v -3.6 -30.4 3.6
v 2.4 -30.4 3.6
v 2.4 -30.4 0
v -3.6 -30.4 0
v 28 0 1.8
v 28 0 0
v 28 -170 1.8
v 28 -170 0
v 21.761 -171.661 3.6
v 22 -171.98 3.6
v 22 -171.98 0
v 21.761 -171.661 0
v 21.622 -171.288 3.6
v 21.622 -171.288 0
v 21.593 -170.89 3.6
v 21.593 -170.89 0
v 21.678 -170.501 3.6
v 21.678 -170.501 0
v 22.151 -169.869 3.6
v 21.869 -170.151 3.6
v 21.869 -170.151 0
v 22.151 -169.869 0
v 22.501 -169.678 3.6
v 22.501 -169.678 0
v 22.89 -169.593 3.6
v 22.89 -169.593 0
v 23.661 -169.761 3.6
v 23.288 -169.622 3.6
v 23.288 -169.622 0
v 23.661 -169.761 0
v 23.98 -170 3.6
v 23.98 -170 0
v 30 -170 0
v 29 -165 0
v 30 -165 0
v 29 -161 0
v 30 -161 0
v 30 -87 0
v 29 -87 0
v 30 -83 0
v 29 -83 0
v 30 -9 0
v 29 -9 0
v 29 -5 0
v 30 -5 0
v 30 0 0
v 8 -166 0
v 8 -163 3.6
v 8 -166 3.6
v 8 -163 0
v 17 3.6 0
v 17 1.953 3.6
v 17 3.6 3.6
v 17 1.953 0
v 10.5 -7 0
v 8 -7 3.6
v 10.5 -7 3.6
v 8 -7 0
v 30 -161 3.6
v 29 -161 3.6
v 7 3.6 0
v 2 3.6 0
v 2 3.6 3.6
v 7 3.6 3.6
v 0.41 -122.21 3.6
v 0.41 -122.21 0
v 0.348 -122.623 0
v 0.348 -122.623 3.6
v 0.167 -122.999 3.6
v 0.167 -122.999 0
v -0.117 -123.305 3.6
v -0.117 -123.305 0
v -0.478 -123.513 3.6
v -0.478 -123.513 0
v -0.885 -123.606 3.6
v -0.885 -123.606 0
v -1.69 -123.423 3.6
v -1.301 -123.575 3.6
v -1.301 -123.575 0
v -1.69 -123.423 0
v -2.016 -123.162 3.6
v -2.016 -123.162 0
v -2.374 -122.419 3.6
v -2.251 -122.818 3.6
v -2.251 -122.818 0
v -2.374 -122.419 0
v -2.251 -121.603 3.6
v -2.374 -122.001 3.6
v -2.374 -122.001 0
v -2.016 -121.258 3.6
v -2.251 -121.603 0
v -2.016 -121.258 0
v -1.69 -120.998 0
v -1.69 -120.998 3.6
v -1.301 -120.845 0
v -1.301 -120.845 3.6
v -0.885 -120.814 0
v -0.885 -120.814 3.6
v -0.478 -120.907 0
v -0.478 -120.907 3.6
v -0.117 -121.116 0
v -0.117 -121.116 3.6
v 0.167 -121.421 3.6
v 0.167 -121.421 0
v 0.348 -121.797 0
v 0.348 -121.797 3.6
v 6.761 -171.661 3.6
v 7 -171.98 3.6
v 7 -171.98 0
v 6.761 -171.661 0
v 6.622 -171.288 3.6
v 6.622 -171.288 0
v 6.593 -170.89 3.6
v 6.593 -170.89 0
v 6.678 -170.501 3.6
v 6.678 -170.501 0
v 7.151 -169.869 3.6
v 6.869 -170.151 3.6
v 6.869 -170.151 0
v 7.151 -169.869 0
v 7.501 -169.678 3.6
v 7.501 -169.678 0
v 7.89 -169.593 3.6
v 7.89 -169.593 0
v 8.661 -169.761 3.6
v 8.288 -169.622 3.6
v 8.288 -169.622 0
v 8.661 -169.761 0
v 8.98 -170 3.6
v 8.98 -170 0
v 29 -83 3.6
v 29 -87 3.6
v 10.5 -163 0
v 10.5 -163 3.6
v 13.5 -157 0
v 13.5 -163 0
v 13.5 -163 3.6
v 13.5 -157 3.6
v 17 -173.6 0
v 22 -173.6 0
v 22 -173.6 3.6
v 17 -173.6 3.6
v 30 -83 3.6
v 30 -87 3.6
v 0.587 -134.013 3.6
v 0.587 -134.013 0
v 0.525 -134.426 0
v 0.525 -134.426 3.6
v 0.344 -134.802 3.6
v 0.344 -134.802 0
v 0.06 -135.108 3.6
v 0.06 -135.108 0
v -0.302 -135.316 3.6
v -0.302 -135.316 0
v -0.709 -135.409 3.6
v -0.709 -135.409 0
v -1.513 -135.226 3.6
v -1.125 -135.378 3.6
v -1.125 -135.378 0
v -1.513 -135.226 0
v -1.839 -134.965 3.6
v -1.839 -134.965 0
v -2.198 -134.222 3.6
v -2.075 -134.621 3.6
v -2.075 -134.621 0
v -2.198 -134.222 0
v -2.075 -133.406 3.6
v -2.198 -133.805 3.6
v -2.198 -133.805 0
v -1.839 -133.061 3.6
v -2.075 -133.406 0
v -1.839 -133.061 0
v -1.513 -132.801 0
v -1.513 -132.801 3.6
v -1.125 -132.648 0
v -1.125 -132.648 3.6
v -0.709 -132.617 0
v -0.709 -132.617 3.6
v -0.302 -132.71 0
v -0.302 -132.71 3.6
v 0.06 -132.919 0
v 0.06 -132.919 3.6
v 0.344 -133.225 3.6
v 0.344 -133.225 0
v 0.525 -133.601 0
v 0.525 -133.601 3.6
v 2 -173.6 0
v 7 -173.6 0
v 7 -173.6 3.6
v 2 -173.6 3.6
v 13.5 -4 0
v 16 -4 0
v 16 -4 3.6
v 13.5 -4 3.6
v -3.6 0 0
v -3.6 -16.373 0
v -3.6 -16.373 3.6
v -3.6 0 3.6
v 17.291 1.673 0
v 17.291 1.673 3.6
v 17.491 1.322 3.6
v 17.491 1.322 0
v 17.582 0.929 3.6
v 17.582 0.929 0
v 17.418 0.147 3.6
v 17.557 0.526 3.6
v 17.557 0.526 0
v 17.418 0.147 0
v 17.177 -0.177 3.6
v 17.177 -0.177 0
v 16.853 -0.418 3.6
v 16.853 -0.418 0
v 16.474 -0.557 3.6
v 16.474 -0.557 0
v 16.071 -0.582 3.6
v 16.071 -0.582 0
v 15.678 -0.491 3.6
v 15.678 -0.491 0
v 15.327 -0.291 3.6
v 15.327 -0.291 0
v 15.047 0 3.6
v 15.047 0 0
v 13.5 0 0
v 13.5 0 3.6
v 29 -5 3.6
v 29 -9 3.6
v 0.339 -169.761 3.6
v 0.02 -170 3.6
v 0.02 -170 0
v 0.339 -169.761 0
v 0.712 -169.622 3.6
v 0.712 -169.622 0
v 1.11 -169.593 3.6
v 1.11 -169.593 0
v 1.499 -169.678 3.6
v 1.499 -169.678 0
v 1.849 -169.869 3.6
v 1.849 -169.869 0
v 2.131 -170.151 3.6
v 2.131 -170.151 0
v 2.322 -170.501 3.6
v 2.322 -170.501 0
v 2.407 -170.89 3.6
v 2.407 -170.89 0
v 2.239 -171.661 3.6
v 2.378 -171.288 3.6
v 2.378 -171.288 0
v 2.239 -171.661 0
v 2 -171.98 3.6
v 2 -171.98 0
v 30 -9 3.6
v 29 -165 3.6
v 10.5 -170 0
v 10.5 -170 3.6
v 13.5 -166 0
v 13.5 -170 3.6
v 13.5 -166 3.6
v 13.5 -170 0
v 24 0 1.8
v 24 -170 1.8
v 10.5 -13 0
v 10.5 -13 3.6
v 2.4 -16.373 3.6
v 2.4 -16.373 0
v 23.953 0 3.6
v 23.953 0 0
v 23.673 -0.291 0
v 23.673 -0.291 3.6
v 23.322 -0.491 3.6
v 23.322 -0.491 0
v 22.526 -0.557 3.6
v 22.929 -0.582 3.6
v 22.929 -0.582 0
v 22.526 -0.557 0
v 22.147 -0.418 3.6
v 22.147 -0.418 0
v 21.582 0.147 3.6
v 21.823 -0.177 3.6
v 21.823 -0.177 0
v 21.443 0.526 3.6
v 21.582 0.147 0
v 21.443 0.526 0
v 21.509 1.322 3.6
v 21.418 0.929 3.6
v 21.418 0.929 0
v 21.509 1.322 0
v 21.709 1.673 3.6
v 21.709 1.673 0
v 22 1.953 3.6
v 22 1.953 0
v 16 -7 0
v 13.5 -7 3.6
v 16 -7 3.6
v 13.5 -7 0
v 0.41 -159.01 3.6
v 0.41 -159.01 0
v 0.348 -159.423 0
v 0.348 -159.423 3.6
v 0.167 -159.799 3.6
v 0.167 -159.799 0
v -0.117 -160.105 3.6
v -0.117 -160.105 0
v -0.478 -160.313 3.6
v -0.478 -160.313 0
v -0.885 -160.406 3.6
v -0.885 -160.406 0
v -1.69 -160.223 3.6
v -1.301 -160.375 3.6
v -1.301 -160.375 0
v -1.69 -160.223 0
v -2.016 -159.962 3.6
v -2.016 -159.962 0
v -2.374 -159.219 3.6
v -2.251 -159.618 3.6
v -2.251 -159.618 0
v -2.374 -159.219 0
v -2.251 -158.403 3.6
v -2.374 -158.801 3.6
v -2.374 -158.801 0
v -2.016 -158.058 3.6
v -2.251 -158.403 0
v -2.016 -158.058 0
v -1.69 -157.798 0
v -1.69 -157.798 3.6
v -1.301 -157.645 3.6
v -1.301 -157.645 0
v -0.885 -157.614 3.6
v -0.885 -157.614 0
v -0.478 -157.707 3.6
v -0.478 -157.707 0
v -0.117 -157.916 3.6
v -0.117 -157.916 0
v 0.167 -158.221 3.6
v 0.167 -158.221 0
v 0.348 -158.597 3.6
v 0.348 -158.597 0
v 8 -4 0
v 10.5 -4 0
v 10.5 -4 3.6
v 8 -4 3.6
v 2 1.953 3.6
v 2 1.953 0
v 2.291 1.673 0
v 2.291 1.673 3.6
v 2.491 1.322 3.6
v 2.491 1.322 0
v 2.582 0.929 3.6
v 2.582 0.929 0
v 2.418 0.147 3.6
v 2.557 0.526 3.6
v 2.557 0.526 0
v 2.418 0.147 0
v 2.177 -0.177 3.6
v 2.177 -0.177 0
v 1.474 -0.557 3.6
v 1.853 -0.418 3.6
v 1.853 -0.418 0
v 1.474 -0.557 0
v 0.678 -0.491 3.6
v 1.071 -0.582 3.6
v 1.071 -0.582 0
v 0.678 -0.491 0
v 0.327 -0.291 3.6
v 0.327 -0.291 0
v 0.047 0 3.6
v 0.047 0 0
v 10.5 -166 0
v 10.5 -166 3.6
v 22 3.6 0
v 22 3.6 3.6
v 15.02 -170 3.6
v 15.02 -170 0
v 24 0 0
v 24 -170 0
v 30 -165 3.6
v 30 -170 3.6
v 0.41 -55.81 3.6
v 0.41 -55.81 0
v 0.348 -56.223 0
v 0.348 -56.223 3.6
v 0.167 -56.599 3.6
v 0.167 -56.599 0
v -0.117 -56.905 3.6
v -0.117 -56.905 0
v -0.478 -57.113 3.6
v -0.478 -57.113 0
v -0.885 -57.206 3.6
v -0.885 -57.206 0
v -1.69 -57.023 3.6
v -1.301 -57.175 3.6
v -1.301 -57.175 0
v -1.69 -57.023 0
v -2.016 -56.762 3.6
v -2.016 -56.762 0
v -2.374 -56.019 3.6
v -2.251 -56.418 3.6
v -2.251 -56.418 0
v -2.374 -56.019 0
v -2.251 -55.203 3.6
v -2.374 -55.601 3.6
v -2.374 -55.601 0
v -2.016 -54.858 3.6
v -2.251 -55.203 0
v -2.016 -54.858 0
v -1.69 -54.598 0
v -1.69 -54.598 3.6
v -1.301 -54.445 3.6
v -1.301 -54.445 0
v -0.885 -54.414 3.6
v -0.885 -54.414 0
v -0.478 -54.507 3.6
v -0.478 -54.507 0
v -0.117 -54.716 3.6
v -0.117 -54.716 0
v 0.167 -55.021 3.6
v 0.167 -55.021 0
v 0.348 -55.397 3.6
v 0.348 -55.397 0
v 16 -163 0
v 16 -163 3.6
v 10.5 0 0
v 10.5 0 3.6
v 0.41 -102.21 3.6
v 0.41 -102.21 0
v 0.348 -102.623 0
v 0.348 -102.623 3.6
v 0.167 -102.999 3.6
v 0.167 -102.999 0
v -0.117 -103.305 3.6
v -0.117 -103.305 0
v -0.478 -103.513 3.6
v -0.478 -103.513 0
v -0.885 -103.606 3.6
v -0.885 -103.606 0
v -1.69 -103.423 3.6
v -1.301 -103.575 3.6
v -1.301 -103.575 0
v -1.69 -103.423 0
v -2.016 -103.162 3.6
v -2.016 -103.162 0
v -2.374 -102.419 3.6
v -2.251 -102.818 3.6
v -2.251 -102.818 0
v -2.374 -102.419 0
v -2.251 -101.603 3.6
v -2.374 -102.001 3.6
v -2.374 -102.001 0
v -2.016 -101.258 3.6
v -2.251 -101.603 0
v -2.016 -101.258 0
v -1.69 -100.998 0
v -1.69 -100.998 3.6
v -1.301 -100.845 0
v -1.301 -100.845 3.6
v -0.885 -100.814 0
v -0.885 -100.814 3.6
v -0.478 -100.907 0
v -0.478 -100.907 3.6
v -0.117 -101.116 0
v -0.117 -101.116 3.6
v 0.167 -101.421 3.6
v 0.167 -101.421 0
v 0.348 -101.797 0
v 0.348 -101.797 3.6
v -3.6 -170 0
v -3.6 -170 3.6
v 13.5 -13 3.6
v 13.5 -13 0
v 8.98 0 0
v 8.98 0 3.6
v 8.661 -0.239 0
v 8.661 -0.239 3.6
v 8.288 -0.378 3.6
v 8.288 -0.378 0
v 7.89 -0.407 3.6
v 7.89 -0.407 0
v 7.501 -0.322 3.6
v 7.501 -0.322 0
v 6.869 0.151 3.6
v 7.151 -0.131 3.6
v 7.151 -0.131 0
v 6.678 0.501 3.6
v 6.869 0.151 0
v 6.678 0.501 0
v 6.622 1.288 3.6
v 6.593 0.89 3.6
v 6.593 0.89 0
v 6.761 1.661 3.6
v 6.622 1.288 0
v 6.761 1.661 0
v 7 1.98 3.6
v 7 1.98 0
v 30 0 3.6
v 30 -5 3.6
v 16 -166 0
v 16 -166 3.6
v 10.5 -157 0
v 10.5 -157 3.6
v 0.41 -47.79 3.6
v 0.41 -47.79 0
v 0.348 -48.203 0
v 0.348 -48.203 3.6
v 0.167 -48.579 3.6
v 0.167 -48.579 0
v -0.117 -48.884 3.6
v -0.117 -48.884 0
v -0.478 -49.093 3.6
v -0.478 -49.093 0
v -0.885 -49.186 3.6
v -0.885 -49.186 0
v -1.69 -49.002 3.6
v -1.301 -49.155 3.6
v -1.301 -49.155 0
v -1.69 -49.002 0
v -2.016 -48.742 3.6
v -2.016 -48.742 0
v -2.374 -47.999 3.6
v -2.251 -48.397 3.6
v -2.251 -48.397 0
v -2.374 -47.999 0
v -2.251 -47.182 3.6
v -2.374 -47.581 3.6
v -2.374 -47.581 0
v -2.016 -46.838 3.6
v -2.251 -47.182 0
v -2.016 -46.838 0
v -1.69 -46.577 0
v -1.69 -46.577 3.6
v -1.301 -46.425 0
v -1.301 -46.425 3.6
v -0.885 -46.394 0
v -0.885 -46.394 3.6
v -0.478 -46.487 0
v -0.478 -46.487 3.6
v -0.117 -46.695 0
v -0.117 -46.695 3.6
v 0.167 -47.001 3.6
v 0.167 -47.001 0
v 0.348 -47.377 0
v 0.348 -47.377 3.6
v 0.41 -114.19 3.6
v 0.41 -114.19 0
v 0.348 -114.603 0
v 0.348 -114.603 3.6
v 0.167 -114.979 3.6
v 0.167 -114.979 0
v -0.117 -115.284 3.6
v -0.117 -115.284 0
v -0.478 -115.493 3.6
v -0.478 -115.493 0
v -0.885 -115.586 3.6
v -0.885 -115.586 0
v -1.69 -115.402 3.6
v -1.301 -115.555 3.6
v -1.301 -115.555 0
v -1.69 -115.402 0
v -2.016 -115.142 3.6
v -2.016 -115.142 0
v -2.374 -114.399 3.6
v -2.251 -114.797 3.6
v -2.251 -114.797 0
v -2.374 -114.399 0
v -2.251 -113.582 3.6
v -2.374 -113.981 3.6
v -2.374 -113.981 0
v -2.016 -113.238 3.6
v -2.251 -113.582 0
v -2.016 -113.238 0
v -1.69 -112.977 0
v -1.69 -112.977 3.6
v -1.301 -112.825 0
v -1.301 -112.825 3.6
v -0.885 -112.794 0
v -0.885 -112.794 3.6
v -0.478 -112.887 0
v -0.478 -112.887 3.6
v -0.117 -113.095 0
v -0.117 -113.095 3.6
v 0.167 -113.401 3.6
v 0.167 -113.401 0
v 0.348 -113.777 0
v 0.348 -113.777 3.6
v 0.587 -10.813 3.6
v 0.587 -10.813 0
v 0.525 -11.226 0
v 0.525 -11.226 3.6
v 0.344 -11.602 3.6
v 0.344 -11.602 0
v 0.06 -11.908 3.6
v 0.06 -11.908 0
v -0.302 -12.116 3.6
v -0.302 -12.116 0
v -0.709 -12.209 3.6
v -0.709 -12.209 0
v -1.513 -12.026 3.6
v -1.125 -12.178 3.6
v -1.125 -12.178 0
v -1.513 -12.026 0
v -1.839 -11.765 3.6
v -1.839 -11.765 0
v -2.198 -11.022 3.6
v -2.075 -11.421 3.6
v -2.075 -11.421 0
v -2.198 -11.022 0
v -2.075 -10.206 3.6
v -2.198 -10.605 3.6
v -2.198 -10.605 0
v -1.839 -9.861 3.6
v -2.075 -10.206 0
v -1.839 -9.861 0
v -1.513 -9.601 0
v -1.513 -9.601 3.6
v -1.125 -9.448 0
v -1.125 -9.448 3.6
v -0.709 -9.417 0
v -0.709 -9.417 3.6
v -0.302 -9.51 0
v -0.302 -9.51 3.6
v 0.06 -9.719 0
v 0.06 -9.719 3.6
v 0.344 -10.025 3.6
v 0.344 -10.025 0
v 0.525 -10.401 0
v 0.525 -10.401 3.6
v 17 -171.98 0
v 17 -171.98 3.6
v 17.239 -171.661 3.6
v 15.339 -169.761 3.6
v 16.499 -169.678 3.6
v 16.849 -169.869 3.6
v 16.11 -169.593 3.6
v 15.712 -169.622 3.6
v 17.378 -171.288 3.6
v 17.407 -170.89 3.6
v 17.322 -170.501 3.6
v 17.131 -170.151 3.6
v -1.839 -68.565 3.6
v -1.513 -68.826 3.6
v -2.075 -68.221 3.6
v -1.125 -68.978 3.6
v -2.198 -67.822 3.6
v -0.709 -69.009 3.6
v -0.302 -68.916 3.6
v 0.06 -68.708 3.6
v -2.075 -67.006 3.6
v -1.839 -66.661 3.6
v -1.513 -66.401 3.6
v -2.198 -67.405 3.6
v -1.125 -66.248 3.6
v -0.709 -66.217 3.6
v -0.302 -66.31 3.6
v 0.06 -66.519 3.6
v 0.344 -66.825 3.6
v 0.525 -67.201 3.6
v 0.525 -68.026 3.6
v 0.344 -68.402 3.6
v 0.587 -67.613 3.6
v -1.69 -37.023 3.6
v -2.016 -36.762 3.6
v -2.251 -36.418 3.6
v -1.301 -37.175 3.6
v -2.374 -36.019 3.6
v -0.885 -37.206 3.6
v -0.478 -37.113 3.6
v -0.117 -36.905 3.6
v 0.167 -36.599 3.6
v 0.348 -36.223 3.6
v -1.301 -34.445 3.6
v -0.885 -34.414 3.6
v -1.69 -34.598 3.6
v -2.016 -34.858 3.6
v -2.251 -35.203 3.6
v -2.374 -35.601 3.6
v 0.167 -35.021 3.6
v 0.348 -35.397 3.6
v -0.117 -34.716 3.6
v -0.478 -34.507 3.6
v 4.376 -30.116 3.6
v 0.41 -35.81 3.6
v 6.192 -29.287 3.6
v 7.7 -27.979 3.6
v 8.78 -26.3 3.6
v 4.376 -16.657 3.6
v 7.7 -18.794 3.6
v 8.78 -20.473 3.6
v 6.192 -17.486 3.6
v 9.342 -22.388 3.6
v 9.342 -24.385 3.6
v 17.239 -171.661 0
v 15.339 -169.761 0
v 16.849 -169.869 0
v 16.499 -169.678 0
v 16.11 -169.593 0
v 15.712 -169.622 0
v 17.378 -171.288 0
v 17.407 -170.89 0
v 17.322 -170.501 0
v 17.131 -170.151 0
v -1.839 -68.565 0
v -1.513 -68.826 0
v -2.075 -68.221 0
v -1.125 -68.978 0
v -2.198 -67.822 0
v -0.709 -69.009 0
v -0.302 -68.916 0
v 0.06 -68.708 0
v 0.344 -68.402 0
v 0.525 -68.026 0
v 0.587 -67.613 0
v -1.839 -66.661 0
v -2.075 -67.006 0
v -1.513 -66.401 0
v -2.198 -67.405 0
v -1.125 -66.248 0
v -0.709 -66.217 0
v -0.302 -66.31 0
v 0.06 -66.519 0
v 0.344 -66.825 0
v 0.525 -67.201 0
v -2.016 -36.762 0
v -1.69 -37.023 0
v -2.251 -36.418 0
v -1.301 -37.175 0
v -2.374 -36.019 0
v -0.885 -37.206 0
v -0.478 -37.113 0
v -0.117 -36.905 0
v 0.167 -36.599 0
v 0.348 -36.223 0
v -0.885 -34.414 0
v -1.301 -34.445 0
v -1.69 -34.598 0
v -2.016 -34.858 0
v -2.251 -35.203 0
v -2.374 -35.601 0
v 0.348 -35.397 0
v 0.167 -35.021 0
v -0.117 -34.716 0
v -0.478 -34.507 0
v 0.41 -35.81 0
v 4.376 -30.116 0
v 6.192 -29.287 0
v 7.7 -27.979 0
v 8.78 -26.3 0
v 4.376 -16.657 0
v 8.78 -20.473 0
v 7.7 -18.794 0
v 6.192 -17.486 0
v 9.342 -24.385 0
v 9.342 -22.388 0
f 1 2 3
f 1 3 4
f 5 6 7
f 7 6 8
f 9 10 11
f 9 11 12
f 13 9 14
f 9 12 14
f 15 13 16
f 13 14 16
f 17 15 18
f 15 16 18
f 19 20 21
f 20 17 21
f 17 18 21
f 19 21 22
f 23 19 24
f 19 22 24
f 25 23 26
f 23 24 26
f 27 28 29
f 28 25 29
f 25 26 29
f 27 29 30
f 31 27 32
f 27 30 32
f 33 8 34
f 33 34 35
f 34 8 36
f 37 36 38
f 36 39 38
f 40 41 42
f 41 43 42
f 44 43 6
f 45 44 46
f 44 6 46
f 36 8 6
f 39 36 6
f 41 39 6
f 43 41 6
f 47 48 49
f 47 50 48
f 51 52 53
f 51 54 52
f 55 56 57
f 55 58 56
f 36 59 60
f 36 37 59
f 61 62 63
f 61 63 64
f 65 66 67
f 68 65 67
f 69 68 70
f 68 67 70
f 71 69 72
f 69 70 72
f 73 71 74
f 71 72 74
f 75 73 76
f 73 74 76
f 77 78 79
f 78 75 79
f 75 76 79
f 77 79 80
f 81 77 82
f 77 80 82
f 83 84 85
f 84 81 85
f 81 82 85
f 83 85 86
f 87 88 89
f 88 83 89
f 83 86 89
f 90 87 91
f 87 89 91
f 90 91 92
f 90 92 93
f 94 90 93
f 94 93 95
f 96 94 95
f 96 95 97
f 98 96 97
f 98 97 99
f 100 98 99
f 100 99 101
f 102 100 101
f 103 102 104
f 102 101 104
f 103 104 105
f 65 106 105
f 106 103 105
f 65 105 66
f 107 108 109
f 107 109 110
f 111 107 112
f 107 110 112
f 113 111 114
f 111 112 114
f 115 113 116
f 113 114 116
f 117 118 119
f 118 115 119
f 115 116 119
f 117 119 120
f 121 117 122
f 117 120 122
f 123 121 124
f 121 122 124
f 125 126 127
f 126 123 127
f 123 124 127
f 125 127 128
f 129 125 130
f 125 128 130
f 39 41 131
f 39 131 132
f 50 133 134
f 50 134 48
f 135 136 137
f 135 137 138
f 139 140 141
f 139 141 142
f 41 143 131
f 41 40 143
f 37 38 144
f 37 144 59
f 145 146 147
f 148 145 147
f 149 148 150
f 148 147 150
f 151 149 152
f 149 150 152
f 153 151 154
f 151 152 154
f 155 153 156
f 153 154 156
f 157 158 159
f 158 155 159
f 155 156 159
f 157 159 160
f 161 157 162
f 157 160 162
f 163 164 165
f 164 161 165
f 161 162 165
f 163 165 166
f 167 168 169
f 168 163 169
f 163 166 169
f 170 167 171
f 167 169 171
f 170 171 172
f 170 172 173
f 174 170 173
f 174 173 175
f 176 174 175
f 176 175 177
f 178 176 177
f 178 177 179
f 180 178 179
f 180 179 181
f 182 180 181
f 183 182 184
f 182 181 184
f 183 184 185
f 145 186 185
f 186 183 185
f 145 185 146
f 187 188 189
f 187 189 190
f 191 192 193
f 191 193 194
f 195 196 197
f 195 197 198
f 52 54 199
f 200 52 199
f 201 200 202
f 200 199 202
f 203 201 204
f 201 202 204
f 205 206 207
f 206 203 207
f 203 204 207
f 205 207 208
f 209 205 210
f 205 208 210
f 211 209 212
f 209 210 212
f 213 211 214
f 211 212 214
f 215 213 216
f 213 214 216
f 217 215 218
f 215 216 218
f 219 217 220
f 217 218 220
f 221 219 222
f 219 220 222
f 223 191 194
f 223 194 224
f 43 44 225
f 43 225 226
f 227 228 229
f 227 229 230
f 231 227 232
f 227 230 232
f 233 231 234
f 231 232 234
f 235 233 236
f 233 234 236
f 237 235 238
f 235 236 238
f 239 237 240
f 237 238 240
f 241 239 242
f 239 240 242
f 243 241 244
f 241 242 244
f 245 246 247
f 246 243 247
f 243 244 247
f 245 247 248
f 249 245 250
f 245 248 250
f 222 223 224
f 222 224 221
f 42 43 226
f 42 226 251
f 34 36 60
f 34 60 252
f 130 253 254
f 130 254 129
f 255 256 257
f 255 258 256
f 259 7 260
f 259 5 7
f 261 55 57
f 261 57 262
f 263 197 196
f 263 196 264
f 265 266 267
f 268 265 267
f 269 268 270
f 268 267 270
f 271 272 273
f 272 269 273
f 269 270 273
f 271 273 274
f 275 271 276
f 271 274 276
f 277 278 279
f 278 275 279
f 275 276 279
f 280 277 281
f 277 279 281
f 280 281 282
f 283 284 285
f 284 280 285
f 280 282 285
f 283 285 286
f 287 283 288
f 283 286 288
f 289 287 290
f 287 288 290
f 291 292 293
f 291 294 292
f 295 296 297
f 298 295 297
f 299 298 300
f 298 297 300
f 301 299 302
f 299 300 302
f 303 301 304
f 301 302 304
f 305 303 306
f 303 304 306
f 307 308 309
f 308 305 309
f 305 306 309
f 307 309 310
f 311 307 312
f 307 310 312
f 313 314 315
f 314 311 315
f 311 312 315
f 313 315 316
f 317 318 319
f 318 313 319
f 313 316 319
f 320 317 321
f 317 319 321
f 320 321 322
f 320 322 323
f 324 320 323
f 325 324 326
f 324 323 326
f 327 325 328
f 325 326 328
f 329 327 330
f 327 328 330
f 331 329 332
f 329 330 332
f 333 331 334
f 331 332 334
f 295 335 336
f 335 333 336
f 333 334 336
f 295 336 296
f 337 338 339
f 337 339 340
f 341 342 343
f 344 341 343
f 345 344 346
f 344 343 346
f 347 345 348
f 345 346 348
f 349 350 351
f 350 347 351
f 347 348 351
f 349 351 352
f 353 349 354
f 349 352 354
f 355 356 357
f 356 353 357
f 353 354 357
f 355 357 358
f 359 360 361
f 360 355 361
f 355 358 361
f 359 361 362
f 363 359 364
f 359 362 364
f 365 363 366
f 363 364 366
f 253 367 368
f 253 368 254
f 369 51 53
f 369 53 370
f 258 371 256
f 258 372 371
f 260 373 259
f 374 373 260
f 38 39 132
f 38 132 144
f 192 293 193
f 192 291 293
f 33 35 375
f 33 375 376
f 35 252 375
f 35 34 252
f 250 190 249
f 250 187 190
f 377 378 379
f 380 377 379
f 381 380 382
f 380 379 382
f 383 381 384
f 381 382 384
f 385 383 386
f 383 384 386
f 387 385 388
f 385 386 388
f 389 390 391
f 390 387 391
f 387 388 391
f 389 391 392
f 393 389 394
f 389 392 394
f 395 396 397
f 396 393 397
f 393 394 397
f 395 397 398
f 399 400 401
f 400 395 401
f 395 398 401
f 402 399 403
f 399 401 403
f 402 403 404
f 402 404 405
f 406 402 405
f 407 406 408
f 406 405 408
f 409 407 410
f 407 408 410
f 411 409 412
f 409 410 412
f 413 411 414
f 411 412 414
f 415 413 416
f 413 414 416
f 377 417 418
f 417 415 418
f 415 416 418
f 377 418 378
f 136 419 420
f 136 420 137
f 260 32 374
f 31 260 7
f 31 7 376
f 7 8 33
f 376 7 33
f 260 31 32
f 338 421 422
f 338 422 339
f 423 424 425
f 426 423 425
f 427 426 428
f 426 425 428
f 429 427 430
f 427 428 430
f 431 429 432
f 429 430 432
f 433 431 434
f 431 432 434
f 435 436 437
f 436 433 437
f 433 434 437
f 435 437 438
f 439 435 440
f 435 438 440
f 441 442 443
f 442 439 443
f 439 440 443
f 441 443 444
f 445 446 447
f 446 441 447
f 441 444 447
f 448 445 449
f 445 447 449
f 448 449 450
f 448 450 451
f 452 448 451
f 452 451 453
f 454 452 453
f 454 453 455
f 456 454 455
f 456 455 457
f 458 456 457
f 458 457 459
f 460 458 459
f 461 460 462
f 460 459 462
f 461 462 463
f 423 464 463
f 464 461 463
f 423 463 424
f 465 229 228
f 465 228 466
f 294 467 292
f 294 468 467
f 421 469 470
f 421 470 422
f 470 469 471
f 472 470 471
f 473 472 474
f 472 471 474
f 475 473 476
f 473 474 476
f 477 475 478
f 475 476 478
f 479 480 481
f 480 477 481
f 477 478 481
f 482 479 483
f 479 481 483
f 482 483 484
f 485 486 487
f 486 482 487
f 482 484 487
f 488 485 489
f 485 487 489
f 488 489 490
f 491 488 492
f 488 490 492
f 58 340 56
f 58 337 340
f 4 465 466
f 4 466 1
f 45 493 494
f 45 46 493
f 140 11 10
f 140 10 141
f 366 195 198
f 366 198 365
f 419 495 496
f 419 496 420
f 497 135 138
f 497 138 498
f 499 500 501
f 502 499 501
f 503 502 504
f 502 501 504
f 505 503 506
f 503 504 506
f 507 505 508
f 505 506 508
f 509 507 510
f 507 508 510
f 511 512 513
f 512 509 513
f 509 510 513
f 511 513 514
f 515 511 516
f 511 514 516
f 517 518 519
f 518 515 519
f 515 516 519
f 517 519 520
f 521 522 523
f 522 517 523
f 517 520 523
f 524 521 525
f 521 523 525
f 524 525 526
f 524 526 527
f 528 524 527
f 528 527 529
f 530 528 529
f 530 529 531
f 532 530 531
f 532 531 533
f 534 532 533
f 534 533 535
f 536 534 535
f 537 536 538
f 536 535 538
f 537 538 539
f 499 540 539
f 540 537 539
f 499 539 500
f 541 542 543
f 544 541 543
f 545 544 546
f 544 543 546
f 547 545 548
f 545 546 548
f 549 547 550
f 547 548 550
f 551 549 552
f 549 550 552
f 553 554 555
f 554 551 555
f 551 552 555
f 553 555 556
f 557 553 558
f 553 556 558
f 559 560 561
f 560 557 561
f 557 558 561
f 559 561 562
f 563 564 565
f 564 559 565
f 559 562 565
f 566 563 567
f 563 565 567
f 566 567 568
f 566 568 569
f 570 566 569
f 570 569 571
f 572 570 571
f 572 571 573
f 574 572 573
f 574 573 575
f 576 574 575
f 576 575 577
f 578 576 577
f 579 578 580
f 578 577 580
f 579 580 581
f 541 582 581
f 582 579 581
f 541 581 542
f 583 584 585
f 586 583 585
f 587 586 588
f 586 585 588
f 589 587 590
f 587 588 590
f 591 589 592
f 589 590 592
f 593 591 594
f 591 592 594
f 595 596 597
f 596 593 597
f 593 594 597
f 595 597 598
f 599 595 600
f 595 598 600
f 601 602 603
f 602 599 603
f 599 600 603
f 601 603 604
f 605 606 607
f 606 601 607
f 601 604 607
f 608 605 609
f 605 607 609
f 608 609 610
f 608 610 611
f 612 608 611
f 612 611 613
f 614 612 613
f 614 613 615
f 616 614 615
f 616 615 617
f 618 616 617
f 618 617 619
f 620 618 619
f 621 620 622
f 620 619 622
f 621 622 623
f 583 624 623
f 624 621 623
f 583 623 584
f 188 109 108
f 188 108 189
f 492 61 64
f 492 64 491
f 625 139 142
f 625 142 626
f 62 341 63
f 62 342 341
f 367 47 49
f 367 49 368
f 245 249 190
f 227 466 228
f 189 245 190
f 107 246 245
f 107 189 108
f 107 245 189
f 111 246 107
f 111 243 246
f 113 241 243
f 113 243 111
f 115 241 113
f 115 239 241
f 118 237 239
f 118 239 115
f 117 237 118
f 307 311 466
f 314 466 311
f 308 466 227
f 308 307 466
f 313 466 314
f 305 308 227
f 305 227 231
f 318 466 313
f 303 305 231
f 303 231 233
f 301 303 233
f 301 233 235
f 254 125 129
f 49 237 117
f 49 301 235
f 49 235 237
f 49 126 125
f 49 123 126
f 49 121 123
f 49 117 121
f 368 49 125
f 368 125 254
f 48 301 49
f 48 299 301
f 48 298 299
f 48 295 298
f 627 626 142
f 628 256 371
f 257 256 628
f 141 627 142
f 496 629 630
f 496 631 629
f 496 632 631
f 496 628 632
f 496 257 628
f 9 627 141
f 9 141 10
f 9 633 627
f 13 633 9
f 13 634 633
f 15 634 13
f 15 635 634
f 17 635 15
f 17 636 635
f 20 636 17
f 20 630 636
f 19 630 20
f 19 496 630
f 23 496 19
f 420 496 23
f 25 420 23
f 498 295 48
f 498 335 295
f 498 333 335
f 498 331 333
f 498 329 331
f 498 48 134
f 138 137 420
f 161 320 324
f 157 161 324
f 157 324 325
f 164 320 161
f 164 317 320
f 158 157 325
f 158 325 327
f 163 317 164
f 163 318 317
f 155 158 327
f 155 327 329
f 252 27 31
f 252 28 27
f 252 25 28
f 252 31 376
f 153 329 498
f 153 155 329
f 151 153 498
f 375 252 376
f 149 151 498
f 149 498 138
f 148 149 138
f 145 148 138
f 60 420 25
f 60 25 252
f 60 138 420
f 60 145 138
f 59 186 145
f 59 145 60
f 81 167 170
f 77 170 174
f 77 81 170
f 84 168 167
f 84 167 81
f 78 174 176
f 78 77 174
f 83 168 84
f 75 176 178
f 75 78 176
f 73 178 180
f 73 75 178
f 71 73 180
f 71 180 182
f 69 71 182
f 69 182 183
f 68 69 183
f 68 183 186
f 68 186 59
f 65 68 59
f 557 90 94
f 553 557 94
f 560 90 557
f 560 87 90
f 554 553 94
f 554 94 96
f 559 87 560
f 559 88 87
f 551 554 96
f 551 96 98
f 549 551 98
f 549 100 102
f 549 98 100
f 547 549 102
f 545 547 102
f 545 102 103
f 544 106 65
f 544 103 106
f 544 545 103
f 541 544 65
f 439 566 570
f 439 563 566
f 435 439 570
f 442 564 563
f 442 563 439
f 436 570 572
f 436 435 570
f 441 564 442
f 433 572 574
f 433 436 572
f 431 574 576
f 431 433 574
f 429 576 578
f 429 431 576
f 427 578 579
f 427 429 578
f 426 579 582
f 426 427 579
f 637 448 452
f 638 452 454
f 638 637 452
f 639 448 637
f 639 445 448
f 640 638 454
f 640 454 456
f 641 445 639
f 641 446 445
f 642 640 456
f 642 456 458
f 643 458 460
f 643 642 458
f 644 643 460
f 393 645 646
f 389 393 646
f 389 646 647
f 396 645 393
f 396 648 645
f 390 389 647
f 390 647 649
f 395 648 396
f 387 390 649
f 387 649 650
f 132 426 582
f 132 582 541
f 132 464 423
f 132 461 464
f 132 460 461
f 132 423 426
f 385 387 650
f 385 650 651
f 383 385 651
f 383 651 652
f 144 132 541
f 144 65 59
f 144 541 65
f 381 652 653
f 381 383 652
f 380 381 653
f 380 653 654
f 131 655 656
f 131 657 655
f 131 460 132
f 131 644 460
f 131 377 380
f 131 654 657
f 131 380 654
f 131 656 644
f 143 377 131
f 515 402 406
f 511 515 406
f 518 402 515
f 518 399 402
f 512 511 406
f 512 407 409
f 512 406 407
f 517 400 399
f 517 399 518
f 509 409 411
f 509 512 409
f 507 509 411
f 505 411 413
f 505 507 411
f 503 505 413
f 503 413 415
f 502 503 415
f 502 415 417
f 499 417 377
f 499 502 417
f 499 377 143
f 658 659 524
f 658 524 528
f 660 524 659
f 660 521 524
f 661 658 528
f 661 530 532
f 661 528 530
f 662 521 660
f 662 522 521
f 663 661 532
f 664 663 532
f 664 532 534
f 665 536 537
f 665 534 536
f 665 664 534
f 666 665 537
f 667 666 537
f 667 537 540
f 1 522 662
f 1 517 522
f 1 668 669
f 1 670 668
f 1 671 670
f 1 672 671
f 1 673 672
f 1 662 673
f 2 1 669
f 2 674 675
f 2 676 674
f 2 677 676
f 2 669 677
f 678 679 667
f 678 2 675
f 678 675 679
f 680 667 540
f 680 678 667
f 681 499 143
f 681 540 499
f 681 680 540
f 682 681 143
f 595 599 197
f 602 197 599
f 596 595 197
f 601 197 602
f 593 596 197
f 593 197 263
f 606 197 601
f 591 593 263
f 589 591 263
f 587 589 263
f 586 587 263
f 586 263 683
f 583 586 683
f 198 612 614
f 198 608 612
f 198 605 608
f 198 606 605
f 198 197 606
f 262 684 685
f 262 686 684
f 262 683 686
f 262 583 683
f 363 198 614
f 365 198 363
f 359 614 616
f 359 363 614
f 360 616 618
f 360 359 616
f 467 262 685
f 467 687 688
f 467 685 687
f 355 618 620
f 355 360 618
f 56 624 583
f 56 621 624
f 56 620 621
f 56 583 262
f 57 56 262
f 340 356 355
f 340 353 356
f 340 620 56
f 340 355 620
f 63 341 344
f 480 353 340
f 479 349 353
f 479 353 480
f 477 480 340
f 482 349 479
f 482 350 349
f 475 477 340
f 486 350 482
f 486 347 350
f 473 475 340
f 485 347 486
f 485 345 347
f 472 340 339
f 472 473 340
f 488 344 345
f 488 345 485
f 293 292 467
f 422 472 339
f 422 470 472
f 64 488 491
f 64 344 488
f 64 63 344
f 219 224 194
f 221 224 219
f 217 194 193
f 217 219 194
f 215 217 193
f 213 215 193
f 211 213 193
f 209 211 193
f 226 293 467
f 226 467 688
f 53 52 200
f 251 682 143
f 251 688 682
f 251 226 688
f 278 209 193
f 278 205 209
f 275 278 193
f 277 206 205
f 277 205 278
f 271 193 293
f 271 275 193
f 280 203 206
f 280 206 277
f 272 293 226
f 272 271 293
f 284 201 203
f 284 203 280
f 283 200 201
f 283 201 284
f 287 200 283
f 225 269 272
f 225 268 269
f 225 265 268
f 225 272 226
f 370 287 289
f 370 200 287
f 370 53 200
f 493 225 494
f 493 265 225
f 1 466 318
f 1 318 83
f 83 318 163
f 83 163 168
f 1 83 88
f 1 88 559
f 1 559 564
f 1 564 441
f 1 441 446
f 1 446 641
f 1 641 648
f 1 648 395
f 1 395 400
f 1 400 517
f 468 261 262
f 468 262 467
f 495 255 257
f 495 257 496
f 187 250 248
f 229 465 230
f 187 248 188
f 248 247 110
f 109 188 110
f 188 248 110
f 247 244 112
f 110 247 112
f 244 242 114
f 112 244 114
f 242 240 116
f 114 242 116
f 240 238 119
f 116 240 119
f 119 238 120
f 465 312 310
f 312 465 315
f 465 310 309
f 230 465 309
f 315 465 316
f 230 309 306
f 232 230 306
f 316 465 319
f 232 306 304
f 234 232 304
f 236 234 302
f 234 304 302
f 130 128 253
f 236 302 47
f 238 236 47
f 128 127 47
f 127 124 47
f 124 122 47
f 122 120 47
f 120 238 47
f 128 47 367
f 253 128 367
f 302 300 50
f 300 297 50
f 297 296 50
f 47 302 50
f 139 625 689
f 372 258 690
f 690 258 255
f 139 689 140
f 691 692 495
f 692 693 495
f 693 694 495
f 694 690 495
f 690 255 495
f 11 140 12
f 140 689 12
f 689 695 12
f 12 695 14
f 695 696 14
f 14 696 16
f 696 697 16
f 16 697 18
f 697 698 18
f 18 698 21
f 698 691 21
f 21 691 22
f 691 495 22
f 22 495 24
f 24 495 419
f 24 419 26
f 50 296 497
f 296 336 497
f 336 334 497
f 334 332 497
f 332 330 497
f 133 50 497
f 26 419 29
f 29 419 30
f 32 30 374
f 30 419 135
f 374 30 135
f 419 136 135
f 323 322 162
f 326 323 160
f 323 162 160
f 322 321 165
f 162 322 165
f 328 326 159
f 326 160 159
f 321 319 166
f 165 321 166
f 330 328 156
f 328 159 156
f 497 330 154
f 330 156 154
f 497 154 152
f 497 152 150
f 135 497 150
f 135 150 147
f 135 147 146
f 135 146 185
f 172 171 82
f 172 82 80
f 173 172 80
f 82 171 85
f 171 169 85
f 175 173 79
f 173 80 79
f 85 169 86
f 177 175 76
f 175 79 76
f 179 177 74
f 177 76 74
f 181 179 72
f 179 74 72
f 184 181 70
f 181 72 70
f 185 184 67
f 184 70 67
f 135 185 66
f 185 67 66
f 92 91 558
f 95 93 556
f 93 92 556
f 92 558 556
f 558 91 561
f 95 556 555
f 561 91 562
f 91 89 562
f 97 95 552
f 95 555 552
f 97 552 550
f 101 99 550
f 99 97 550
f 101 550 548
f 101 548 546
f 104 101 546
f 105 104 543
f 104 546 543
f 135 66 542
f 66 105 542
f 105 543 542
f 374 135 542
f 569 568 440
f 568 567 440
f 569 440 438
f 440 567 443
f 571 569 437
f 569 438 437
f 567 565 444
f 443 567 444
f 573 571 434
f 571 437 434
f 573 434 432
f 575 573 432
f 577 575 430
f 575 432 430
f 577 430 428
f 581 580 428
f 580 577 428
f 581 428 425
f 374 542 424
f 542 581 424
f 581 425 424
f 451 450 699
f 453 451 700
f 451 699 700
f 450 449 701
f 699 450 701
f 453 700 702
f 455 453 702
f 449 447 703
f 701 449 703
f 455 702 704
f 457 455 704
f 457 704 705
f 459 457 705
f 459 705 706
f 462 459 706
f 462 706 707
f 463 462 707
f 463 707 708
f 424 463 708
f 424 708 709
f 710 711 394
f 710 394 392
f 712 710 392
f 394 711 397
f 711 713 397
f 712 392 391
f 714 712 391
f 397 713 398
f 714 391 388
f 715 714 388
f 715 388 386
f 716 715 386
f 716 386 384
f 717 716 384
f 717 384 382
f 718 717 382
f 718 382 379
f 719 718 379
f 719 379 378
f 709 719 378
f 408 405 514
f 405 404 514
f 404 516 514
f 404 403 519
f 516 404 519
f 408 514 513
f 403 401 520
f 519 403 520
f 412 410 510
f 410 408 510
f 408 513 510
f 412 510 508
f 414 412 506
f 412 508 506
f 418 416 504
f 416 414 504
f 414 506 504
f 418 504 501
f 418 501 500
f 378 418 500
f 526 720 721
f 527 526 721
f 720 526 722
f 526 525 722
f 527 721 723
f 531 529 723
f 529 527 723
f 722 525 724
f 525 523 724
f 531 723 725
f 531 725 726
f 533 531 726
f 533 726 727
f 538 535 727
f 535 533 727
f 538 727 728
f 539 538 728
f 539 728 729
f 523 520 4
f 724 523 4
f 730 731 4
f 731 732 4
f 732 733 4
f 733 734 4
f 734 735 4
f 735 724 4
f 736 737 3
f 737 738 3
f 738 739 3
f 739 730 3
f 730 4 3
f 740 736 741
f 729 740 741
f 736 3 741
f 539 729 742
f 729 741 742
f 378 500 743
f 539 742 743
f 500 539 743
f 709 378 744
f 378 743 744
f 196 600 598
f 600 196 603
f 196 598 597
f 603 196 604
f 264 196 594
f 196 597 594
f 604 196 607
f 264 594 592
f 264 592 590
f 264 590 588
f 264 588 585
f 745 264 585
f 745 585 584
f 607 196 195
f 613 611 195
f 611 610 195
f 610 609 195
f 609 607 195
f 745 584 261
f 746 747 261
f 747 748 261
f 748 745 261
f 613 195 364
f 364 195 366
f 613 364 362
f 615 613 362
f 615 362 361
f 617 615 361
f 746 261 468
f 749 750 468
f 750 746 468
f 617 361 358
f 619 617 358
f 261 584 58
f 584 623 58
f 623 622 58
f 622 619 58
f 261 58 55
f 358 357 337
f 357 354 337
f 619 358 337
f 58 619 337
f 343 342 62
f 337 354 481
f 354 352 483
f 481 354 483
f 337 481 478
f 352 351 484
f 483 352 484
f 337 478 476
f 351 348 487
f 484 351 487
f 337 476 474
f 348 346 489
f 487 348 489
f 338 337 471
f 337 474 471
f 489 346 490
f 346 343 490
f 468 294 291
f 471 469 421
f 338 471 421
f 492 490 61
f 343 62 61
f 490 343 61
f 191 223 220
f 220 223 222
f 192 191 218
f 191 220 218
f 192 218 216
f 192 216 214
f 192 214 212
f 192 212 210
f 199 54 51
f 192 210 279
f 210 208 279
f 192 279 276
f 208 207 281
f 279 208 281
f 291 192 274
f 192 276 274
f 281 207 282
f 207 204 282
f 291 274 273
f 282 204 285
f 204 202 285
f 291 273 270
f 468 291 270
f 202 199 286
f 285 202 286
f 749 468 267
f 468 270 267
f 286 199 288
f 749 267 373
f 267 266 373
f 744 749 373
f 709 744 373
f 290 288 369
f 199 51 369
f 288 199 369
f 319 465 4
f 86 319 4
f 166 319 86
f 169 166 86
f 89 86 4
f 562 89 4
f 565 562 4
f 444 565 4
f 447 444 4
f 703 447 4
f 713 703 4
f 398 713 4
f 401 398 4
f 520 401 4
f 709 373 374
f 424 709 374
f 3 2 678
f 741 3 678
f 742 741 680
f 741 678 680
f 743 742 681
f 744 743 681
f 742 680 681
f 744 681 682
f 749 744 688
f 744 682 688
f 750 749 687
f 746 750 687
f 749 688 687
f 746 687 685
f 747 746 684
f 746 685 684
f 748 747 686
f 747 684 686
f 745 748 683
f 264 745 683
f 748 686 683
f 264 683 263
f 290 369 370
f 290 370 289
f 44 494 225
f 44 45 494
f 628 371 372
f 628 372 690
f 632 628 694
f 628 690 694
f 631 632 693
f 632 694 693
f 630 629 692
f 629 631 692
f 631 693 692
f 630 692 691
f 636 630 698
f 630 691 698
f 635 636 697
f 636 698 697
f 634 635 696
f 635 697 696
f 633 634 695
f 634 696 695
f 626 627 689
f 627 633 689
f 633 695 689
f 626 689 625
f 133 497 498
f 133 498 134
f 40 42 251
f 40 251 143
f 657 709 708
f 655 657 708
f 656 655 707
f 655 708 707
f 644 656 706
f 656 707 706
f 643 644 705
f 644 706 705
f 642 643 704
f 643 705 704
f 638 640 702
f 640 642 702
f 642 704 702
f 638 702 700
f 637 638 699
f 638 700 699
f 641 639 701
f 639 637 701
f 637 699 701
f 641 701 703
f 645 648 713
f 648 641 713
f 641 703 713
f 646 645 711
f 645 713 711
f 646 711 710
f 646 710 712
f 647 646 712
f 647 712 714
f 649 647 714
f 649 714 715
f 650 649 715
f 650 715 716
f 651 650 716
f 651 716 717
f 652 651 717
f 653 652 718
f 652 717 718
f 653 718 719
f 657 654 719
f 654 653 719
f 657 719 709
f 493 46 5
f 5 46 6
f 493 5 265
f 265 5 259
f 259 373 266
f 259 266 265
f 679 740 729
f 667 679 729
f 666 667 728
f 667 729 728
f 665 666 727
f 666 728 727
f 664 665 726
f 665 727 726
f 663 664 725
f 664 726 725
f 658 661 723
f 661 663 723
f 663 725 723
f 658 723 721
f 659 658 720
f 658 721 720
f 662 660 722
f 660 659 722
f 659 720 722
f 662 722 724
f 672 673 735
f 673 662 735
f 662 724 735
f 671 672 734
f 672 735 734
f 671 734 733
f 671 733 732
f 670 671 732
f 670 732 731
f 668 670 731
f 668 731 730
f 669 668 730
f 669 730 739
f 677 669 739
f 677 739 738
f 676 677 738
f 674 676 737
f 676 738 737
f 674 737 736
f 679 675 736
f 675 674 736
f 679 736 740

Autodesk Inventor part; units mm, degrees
ref_plane "YZ Plane" through (0, 0, 0) normal (1, 0, 0) x (0, 1, 0)
ref_plane "XZ Plane" through (0, 0, 0) normal (0, 1, 0) x (-1, 0, 0)
ref_plane "XY Plane" through (0, 0, 0) normal (0, 0, 1) x (1, 0, 0)
ref_plane "Work Plane1" through (0, 0, 0) normal (0, 0, 1) x (1, 0, 0)
sketch "Sketch1" plane through (0, 0, 0) normal (0, 0, 1) x (1, 0, 0)
  line L0 (30, 0) -> (23.9528, 0) projected
  line L1 (30, 0) -> (30, -5) projected
  line L2 (23.9799, -170) -> (30, -170) projected
  line L3 (22, -171.9799) -> (22, -173.6) projected
  line L4 (22, -173.6) -> (17, -173.6) projected
  line L5 (17, -173.6) -> (17, -171.9799) projected
  line L6 (15.0201, -170) -> (13.5, -170) projected
  line L7 (13.5, -170) -> (13.5, -166) projected
  line L8 (13.5, -166) -> (16, -166) projected
  line L9 (16, -166) -> (16, -163) projected
  line L10 (16, -163) -> (13.5, -163) projected
  line L11 (13.5, -163) -> (13.5, -157) projected
  line L12 (13.5, -157) -> (10.5, -157) projected
  line L13 (10.5, -157) -> (10.5, -163) projected
  line L14 (10.5, -163) -> (8, -163) projected
  line L15 (8, -163) -> (8, -166) projected
  line L16 (8, -166) -> (10.5, -166) projected
  line L17 (10.5, -166) -> (10.5, -170) projected
  line L18 (10.5, -170) -> (8.9799, -170) projected
  line L19 (7, -171.9799) -> (7, -173.6) projected
  line L20 (7, -173.6) -> (2, -173.6) projected
  line L21 (2, -173.6) -> (2, -171.9799) projected
  line L22 (0.0201, -170) -> (-3.6, -170) projected
  line L23 (-3.6, -170) -> (-3.6, 0) projected
  line L24 (-3.6, 0) -> (0.0472, 0) projected
  line L25 (2, 1.9528) -> (2, 3.6) projected
  line L26 (2, 3.6) -> (7, 3.6) projected
  line L27 (7, 3.6) -> (7, 1.9799) projected
  line L28 (8.9799, 0) -> (10.5, 0) projected
  line L29 (10.5, 0) -> (10.5, -4) projected
  line L30 (10.5, -4) -> (8, -4) projected
  line L31 (8, -4) -> (8, -7) projected
  line L32 (8, -7) -> (10.5, -7) projected
  line L33 (10.5, -7) -> (10.5, -13) projected
  line L34 (10.5, -13) -> (13.5, -13) projected
  line L35 (13.5, -13) -> (13.5, -7) projected
  line L36 (13.5, -7) -> (16, -7) projected
  line L37 (16, -7) -> (16, -4) projected
  line L38 (16, -4) -> (13.5, -4) projected
  line L39 (13.5, -4) -> (13.5, 0) projected
  line L40 (13.5, 0) -> (15.0472, 0) projected
  line L41 (17, 1.9528) -> (17, 3.6) projected
  line L42 (17, 3.6) -> (22, 3.6) projected
  line L43 (22, 3.6) -> (22, 1.9528) projected
  line L44 (29, -165) -> (30, -165) projected
  line L45 (30, -5) -> (29, -5) projected
  line L46 (29, -5) -> (29, -9) projected
  line L47 (29, -9) -> (30, -9) projected
  line L48 (30, -9) -> (30, -83) projected
  line L49 (30, -83) -> (29, -83) projected
  line L50 (29, -83) -> (29, -87) projected
  line L51 (29, -87) -> (30, -87) projected
  line L52 (30, -87) -> (30, -161) projected
  line L53 (30, -161) -> (29, -161) projected
  line L54 (29, -161) -> (29, -165) projected
  arc A0 (17, -171.9799) -> (15.0201, -170) centre (16.0101, -170.9899) ccw projected
  arc A1 (8.9799, -170) -> (7, -171.9799) centre (7.9899, -170.9899) ccw projected
  arc A2 (2, -171.9799) -> (0.0201, -170) centre (1.0101, -170.9899) ccw projected
  arc A3 (0.0472, 0) -> (2, 1.9528) centre (1.1868, 0.8132) ccw projected
  arc A4 (7, 1.9799) -> (8.9799, 0) centre (7.9899, 0.9899) ccw projected
  arc A5 (15.0472, 0) -> (17, 1.9528) centre (16.1868, 0.8132) ccw projected
  arc A6 (22, 1.9528) -> (23.9528, 0) centre (22.8132, 0.8132) ccw projected
  line L55 (30, -165) -> (30, -170) projected
  arc A7 (23.9799, -170) -> (22, -171.9799) centre (22.9899, -170.9899) ccw projected
  circle A8 centre (-0.9899, -159.0101) radius 1.4 projected
  circle A9 centre (-0.8132, -134.0132) radius 1.4 projected
  circle A10 centre (-0.9899, -122.2101) radius 1.4 projected
  circle A11 centre (-0.9899, -114.1899) radius 1.4 projected
  circle A12 centre (-0.9899, -102.2101) radius 1.4 projected
  circle A13 centre (-0.8132, -67.6132) radius 1.4 projected
  circle A14 centre (-0.9899, -55.8101) radius 1.4 projected
  circle A15 centre (-0.9899, -47.7899) radius 1.4 projected
  circle A16 centre (-0.9899, -35.8101) radius 1.4 projected
  circle A17 centre (-0.8132, -10.8132) radius 1.4 projected
  point P0 (0, 0)
  point P1 (22, 0)
  point P2 (22, -170)
  point P3 (17, -170)
  point P4 (7, -170)
  point P5 (2, -170)
  point P6 (0, -160)
  point P7 (0, -123.2)
  point P8 (0, -113.2)
  point P9 (0, -103.2)
  point P10 (0, -56.8)
  point P11 (0, -46.8)
  point P12 (0, -36.8)
  point P13 (2, 0)
  point P14 (7, 0)
  point P15 (17, 0)
  point P16 (-1.9799, -160)
  point P17 (-1.9528, -133.2)
  point P18 (-1.9799, -123.2)
  point P19 (-1.9799, -113.2)
  point P20 (-1.9799, -103.2)
  point P21 (-1.9528, -66.8)
  point P22 (-1.9799, -56.8)
  point P23 (-1.9799, -46.8)
  point P24 (-1.9799, -36.8)
  point P25 (-1.9528, -10)
  point P26 (0, -34.8201)
  point P27 (0, -11.9528)
  point P28 (0, -54.8201)
  point P29 (0, -48.7799)
  point P30 (0, -101.2201)
  point P31 (0, -68.7528)
  point P32 (0, -121.2201)
  point P33 (0, -115.1799)
  point P34 (0, -158.0201)
  point P35 (0, -135.1528)
extrude "Extrusion1" add sketch "Sketch1" along normal blind 3.6
sketch "Sketch3" plane through (0, 0, 0) normal (0, 0, -1) x (-1, 0, 0)
  line L0 (-28, -170) -> (-24, -170) projected
  line L1 (-28, 0) -> (-28, -170) projected
  line L2 (-24, 0) -> (-28, 0) projected
  line L3 (-24, 0) -> (-24, -170) projected
  point P0 (0, 0)
extrude "Extrusion3" cut sketch "Sketch3" against normal blind 1.8
sketch "Sketch16" plane through (0, 0, 3.6) normal (0, 0, 1) x (1, 0, 0)
  line L0 (30, -87) -> (29, -87) projected
  line L1 (29, -87) -> (29, -83) projected
  line L2 (29, -83) -> (30, -83) projected
  line L3 (30, -83) -> (30, -9) projected
  line L4 (30, -9) -> (29, -9) projected
  line L5 (29, -9) -> (29, -5) projected
  line L6 (29, -5) -> (30, -5) projected
  line L7 (30, -5) -> (30, 0) projected
  line L8 (30, 0) -> (23.9528, 0) projected
  arc A0 (22, 1.9528) -> (23.9528, 0) centre (22.8132, 0.8132) ccw projected
  line L9 (22, 1.9528) -> (22, 3.6) projected
  line L10 (22, 3.6) -> (17, 3.6) projected
  line L11 (17, 3.6) -> (17, 1.9528) projected
  arc A1 (15.0472, 0) -> (17, 1.9528) centre (16.1868, 0.8132) ccw projected
  line L12 (15.0472, 0) -> (13.5, 0) projected
  line L13 (13.5, 0) -> (13.5, -4) projected
  line L14 (13.5, -4) -> (16, -4) projected
  line L15 (16, -4) -> (16, -7) projected
  line L16 (16, -7) -> (13.5, -7) projected
  line L17 (13.5, -7) -> (13.5, -13) projected
  line L18 (13.5, -13) -> (10.5, -13) projected
  line L19 (10.5, -13) -> (10.5, -7) projected
  line L20 (10.5, -7) -> (8, -7) projected
  line L21 (8, -7) -> (8, -4) projected
  line L22 (8, -4) -> (10.5, -4) projected
  line L23 (10.5, -4) -> (10.5, 0) projected
  line L24 (10.5, 0) -> (8.9799, 0) projected
  arc A2 (7, 1.9799) -> (8.9799, 0) centre (7.9899, 0.9899) ccw projected
  line L25 (7, 1.9799) -> (7, 3.6) projected
  line L26 (7, 3.6) -> (2, 3.6) projected
  line L27 (2, 3.6) -> (2, 1.9528) projected
  arc A3 (0.0472, 0) -> (2, 1.9528) centre (1.1868, 0.8132) ccw projected
  line L28 (0.0472, 0) -> (-3.6, 0) projected
  circle A4 centre (-0.8132, -10.8132) radius 1.4 projected
  circle A5 centre (-0.9899, -35.8101) radius 1.4 projected
  circle A6 centre (-0.9899, -47.7899) radius 1.4 projected
  circle A7 centre (-0.9899, -55.8101) radius 1.4 projected
  circle A8 centre (-0.8132, -67.6132) radius 1.4 projected
  circle A9 centre (-0.9899, -102.2101) radius 1.4 projected
  circle A10 centre (-0.9899, -114.1899) radius 1.4 projected
  circle A11 centre (-0.9899, -122.2101) radius 1.4 projected
  circle A12 centre (-0.8132, -134.0132) radius 1.4 projected
  circle A13 centre (-0.9899, -159.0101) radius 1.4 projected
  line L29 (-3.6, 0) -> (-3.6, -170) projected
  line L30 (-3.6, -170) -> (0.0201, -170) projected
  arc A14 (2, -171.9799) -> (0.0201, -170) centre (1.0101, -170.9899) ccw projected
  line L31 (2, -171.9799) -> (2, -173.6) projected
  line L32 (2, -173.6) -> (7, -173.6) projected
  line L33 (7, -173.6) -> (7, -171.9799) projected
  arc A15 (8.9799, -170) -> (7, -171.9799) centre (7.9899, -170.9899) ccw projected
  line L34 (8.9799, -170) -> (10.5, -170) projected
  line L35 (10.5, -170) -> (10.5, -166) projected
  line L36 (10.5, -166) -> (8, -166) projected
  line L37 (8, -166) -> (8, -163) projected
  line L38 (8, -163) -> (10.5, -163) projected
  line L39 (10.5, -163) -> (10.5, -157) projected
  line L40 (10.5, -157) -> (13.5, -157) projected
  line L41 (13.5, -157) -> (13.5, -163) projected
  line L42 (13.5, -163) -> (16, -163) projected
  line L43 (16, -163) -> (16, -166) projected
  line L44 (16, -166) -> (13.5, -166) projected
  line L45 (13.5, -166) -> (13.5, -170) projected
  line L46 (13.5, -170) -> (15.0201, -170) projected
  arc A16 (17, -171.9799) -> (15.0201, -170) centre (16.0101, -170.9899) ccw projected
  line L47 (17, -171.9799) -> (17, -173.6) projected
  line L48 (17, -173.6) -> (22, -173.6) projected
  line L49 (22, -173.6) -> (22, -171.9799) projected
  arc A17 (23.9799, -170) -> (22, -171.9799) centre (22.9899, -170.9899) ccw projected
  line L50 (23.9799, -170) -> (30, -170) projected
  line L51 (30, -170) -> (30, -165) projected
  line L52 (30, -165) -> (29, -165) projected
  line L53 (29, -165) -> (29, -161) projected
  line L54 (29, -161) -> (30, -161) projected
  line L55 (30, -161) -> (30, -87) projected
  line L56 (0, -30.4) -> (-3.6, -30.4) projected
  line L57 (0, -16.4) -> (-3.6, -16.4) projected
  line L58 (-3.6, -23.3865) -> (2.4, -23.3865) construction
  line L59 (-3.6, -16.3729) -> (2.4, -16.3729)
  line L60 (2.4, -30.4) -> (-3.6, -30.4)
  arc A18 (-3.6, -16.3729) -> (-3.6, -30.4) centre (-3.6, -23.3865) ccw
  arc A19 (2.4, -30.4) -> (2.4, -16.3729) centre (2.4, -23.3865) ccw
  point P0 (0, 0)
  point P1 (-0.6, -23.3865)
  dimension "d39" = 6
extrude "Extrusion6" cut sketch "Sketch16" against normal through all contours A18 L29 | L29 L59 A19 L60 L56
sketch "Sketch17" plane through (0, 0, 3.6) normal (0, 0, 1) x (1, 0, 0)
  line L0 (-3.6, -16.3729) -> (2.4, -16.3729) projected
  arc A0 (2.4, -30.4) -> (2.4, -16.3729) centre (2.4, -23.3865) ccw projected
  line L1 (2.4, -30.4) -> (-3.6, -30.4) projected
  circle A1 centre (-0.9899, -35.8101) radius 1.4 projected
  circle A2 centre (-0.9899, -47.7899) radius 1.4 projected
  circle A3 centre (-0.9899, -55.8101) radius 1.4 projected
  circle A4 centre (-0.8132, -67.6132) radius 1.4 projected
  circle A5 centre (-0.9899, -102.2101) radius 1.4 projected
  circle A6 centre (-0.9899, -114.1899) radius 1.4 projected
  circle A7 centre (-0.9899, -122.2101) radius 1.4 projected
  circle A8 centre (-0.8132, -134.0132) radius 1.4 projected
  circle A9 centre (-0.9899, -159.0101) radius 1.4 projected
  line L2 (-3.6, 0) -> (-3.6, -16.3729) projected
  line L3 (-3.6, -170) -> (0.0201, -170) projected
  arc A10 (2, -171.9799) -> (0.0201, -170) centre (1.0101, -170.9899) ccw projected
  line L4 (2, -171.9799) -> (2, -173.6) projected
  line L5 (2, -173.6) -> (7, -173.6) projected
  line L6 (7, -173.6) -> (7, -171.9799) projected
  arc A11 (8.9799, -170) -> (7, -171.9799) centre (7.9899, -170.9899) ccw projected
  line L7 (8.9799, -170) -> (10.5, -170) projected
  line L8 (10.5, -170) -> (10.5, -166) projected
  line L9 (10.5, -166) -> (8, -166) projected
  line L10 (8, -166) -> (8, -163) projected
  line L11 (8, -163) -> (10.5, -163) projected
  line L12 (10.5, -163) -> (10.5, -157) projected
  line L13 (10.5, -157) -> (13.5, -157) projected
  line L14 (13.5, -157) -> (13.5, -163) projected
  line L15 (13.5, -163) -> (16, -163) projected
  line L16 (16, -163) -> (16, -166) projected
  line L17 (16, -166) -> (13.5, -166) projected
  line L18 (13.5, -166) -> (13.5, -170) projected
  line L19 (13.5, -170) -> (15.0201, -170) projected
  arc A12 (17, -171.9799) -> (15.0201, -170) centre (16.0101, -170.9899) ccw projected
  line L20 (17, -171.9799) -> (17, -173.6) projected
  line L21 (17, -173.6) -> (22, -173.6) projected
  line L22 (22, -173.6) -> (22, -171.9799) projected
  arc A13 (23.9799, -170) -> (22, -171.9799) centre (22.9899, -170.9899) ccw projected
  line L23 (23.9799, -170) -> (30, -170) projected
  line L24 (30, -170) -> (30, -165) projected
  line L25 (30, -165) -> (29, -165) projected
  line L26 (29, -165) -> (29, -161) projected
  line L27 (29, -161) -> (30, -161) projected
  line L28 (30, -161) -> (30, -87) projected
  line L29 (30, -87) -> (29, -87) projected
  line L30 (29, -87) -> (29, -83) projected
  line L31 (29, -83) -> (30, -83) projected
  line L32 (30, -83) -> (30, -9) projected
  line L33 (30, -9) -> (29, -9) projected
  line L34 (29, -9) -> (29, -5) projected
  line L35 (29, -5) -> (30, -5) projected
  line L36 (30, -5) -> (30, 0) projected
  line L37 (30, 0) -> (23.9528, 0) projected
  arc A14 (22, 1.9528) -> (23.9528, 0) centre (22.8132, 0.8132) ccw projected
  line L38 (22, 1.9528) -> (22, 3.6) projected
  line L39 (22, 3.6) -> (17, 3.6) projected
  line L40 (17, 3.6) -> (17, 1.9528) projected
  arc A15 (15.0472, 0) -> (17, 1.9528) centre (16.1868, 0.8132) ccw projected
  line L41 (15.0472, 0) -> (13.5, 0) projected
  line L42 (13.5, 0) -> (13.5, -4) projected
  line L43 (13.5, -4) -> (16, -4) projected
  line L44 (16, -4) -> (16, -7) projected
  line L45 (16, -7) -> (13.5, -7) projected
  line L46 (13.5, -7) -> (13.5, -13) projected
  line L47 (13.5, -13) -> (10.5, -13) projected
  line L48 (10.5, -13) -> (10.5, -7) projected
  line L49 (10.5, -7) -> (8, -7) projected
  line L50 (8, -7) -> (8, -4) projected
  line L51 (8, -4) -> (10.5, -4) projected
  line L52 (10.5, -4) -> (10.5, 0) projected
  line L53 (10.5, 0) -> (8.9799, 0) projected
  arc A16 (7, 1.9799) -> (8.9799, 0) centre (7.9899, 0.9899) ccw projected
  line L54 (7, 1.9799) -> (7, 3.6) projected
  line L55 (7, 3.6) -> (2, 3.6) projected
  line L56 (2, 3.6) -> (2, 1.9528) projected
  arc A17 (0.0472, 0) -> (2, 1.9528) centre (1.1868, 0.8132) ccw projected
  line L57 (0.0472, 0) -> (-3.6, 0) projected
  circle A18 centre (-0.8132, -10.8132) radius 1.4 projected
  line L58 (0, -153.6) -> (-3.6, -153.6) projected
  line L59 (0, -135.1528) -> (0, -158.0201) projected
  arc A19 (-0.2318, -139.5767) -> (5.2144, -151.2768) centre (0, -146.5865) ccw
  arc A20 (8.7055, -149.9855) -> (3.0039, -137.7368) centre (9.7399, -142.0526) ccw
  arc A21 (-0.2318, -139.5767) -> (3.0039, -137.7368) centre (-0.3641, -135.5789) ccw
  arc A22 (8.7055, -149.9855) -> (5.2144, -151.2768) centre (8.1883, -153.9519) ccw
  line L60 (-3.6, -30.4) -> (-3.6, -170) projected
  point P0 (0, 0)
  dimension "d42" = 16
  dimension "d43" = 4
extrude "Extrusion7" [suppressed]
equation "\"d0\" = wood_thickness"
equation "\"d7\" = deep_for_sliding_cover"
equation "\"wood_thickness\" = 3.6"
equation "\"deep_for_sliding_cover\" = 1.8"
properties part number "side_top"
